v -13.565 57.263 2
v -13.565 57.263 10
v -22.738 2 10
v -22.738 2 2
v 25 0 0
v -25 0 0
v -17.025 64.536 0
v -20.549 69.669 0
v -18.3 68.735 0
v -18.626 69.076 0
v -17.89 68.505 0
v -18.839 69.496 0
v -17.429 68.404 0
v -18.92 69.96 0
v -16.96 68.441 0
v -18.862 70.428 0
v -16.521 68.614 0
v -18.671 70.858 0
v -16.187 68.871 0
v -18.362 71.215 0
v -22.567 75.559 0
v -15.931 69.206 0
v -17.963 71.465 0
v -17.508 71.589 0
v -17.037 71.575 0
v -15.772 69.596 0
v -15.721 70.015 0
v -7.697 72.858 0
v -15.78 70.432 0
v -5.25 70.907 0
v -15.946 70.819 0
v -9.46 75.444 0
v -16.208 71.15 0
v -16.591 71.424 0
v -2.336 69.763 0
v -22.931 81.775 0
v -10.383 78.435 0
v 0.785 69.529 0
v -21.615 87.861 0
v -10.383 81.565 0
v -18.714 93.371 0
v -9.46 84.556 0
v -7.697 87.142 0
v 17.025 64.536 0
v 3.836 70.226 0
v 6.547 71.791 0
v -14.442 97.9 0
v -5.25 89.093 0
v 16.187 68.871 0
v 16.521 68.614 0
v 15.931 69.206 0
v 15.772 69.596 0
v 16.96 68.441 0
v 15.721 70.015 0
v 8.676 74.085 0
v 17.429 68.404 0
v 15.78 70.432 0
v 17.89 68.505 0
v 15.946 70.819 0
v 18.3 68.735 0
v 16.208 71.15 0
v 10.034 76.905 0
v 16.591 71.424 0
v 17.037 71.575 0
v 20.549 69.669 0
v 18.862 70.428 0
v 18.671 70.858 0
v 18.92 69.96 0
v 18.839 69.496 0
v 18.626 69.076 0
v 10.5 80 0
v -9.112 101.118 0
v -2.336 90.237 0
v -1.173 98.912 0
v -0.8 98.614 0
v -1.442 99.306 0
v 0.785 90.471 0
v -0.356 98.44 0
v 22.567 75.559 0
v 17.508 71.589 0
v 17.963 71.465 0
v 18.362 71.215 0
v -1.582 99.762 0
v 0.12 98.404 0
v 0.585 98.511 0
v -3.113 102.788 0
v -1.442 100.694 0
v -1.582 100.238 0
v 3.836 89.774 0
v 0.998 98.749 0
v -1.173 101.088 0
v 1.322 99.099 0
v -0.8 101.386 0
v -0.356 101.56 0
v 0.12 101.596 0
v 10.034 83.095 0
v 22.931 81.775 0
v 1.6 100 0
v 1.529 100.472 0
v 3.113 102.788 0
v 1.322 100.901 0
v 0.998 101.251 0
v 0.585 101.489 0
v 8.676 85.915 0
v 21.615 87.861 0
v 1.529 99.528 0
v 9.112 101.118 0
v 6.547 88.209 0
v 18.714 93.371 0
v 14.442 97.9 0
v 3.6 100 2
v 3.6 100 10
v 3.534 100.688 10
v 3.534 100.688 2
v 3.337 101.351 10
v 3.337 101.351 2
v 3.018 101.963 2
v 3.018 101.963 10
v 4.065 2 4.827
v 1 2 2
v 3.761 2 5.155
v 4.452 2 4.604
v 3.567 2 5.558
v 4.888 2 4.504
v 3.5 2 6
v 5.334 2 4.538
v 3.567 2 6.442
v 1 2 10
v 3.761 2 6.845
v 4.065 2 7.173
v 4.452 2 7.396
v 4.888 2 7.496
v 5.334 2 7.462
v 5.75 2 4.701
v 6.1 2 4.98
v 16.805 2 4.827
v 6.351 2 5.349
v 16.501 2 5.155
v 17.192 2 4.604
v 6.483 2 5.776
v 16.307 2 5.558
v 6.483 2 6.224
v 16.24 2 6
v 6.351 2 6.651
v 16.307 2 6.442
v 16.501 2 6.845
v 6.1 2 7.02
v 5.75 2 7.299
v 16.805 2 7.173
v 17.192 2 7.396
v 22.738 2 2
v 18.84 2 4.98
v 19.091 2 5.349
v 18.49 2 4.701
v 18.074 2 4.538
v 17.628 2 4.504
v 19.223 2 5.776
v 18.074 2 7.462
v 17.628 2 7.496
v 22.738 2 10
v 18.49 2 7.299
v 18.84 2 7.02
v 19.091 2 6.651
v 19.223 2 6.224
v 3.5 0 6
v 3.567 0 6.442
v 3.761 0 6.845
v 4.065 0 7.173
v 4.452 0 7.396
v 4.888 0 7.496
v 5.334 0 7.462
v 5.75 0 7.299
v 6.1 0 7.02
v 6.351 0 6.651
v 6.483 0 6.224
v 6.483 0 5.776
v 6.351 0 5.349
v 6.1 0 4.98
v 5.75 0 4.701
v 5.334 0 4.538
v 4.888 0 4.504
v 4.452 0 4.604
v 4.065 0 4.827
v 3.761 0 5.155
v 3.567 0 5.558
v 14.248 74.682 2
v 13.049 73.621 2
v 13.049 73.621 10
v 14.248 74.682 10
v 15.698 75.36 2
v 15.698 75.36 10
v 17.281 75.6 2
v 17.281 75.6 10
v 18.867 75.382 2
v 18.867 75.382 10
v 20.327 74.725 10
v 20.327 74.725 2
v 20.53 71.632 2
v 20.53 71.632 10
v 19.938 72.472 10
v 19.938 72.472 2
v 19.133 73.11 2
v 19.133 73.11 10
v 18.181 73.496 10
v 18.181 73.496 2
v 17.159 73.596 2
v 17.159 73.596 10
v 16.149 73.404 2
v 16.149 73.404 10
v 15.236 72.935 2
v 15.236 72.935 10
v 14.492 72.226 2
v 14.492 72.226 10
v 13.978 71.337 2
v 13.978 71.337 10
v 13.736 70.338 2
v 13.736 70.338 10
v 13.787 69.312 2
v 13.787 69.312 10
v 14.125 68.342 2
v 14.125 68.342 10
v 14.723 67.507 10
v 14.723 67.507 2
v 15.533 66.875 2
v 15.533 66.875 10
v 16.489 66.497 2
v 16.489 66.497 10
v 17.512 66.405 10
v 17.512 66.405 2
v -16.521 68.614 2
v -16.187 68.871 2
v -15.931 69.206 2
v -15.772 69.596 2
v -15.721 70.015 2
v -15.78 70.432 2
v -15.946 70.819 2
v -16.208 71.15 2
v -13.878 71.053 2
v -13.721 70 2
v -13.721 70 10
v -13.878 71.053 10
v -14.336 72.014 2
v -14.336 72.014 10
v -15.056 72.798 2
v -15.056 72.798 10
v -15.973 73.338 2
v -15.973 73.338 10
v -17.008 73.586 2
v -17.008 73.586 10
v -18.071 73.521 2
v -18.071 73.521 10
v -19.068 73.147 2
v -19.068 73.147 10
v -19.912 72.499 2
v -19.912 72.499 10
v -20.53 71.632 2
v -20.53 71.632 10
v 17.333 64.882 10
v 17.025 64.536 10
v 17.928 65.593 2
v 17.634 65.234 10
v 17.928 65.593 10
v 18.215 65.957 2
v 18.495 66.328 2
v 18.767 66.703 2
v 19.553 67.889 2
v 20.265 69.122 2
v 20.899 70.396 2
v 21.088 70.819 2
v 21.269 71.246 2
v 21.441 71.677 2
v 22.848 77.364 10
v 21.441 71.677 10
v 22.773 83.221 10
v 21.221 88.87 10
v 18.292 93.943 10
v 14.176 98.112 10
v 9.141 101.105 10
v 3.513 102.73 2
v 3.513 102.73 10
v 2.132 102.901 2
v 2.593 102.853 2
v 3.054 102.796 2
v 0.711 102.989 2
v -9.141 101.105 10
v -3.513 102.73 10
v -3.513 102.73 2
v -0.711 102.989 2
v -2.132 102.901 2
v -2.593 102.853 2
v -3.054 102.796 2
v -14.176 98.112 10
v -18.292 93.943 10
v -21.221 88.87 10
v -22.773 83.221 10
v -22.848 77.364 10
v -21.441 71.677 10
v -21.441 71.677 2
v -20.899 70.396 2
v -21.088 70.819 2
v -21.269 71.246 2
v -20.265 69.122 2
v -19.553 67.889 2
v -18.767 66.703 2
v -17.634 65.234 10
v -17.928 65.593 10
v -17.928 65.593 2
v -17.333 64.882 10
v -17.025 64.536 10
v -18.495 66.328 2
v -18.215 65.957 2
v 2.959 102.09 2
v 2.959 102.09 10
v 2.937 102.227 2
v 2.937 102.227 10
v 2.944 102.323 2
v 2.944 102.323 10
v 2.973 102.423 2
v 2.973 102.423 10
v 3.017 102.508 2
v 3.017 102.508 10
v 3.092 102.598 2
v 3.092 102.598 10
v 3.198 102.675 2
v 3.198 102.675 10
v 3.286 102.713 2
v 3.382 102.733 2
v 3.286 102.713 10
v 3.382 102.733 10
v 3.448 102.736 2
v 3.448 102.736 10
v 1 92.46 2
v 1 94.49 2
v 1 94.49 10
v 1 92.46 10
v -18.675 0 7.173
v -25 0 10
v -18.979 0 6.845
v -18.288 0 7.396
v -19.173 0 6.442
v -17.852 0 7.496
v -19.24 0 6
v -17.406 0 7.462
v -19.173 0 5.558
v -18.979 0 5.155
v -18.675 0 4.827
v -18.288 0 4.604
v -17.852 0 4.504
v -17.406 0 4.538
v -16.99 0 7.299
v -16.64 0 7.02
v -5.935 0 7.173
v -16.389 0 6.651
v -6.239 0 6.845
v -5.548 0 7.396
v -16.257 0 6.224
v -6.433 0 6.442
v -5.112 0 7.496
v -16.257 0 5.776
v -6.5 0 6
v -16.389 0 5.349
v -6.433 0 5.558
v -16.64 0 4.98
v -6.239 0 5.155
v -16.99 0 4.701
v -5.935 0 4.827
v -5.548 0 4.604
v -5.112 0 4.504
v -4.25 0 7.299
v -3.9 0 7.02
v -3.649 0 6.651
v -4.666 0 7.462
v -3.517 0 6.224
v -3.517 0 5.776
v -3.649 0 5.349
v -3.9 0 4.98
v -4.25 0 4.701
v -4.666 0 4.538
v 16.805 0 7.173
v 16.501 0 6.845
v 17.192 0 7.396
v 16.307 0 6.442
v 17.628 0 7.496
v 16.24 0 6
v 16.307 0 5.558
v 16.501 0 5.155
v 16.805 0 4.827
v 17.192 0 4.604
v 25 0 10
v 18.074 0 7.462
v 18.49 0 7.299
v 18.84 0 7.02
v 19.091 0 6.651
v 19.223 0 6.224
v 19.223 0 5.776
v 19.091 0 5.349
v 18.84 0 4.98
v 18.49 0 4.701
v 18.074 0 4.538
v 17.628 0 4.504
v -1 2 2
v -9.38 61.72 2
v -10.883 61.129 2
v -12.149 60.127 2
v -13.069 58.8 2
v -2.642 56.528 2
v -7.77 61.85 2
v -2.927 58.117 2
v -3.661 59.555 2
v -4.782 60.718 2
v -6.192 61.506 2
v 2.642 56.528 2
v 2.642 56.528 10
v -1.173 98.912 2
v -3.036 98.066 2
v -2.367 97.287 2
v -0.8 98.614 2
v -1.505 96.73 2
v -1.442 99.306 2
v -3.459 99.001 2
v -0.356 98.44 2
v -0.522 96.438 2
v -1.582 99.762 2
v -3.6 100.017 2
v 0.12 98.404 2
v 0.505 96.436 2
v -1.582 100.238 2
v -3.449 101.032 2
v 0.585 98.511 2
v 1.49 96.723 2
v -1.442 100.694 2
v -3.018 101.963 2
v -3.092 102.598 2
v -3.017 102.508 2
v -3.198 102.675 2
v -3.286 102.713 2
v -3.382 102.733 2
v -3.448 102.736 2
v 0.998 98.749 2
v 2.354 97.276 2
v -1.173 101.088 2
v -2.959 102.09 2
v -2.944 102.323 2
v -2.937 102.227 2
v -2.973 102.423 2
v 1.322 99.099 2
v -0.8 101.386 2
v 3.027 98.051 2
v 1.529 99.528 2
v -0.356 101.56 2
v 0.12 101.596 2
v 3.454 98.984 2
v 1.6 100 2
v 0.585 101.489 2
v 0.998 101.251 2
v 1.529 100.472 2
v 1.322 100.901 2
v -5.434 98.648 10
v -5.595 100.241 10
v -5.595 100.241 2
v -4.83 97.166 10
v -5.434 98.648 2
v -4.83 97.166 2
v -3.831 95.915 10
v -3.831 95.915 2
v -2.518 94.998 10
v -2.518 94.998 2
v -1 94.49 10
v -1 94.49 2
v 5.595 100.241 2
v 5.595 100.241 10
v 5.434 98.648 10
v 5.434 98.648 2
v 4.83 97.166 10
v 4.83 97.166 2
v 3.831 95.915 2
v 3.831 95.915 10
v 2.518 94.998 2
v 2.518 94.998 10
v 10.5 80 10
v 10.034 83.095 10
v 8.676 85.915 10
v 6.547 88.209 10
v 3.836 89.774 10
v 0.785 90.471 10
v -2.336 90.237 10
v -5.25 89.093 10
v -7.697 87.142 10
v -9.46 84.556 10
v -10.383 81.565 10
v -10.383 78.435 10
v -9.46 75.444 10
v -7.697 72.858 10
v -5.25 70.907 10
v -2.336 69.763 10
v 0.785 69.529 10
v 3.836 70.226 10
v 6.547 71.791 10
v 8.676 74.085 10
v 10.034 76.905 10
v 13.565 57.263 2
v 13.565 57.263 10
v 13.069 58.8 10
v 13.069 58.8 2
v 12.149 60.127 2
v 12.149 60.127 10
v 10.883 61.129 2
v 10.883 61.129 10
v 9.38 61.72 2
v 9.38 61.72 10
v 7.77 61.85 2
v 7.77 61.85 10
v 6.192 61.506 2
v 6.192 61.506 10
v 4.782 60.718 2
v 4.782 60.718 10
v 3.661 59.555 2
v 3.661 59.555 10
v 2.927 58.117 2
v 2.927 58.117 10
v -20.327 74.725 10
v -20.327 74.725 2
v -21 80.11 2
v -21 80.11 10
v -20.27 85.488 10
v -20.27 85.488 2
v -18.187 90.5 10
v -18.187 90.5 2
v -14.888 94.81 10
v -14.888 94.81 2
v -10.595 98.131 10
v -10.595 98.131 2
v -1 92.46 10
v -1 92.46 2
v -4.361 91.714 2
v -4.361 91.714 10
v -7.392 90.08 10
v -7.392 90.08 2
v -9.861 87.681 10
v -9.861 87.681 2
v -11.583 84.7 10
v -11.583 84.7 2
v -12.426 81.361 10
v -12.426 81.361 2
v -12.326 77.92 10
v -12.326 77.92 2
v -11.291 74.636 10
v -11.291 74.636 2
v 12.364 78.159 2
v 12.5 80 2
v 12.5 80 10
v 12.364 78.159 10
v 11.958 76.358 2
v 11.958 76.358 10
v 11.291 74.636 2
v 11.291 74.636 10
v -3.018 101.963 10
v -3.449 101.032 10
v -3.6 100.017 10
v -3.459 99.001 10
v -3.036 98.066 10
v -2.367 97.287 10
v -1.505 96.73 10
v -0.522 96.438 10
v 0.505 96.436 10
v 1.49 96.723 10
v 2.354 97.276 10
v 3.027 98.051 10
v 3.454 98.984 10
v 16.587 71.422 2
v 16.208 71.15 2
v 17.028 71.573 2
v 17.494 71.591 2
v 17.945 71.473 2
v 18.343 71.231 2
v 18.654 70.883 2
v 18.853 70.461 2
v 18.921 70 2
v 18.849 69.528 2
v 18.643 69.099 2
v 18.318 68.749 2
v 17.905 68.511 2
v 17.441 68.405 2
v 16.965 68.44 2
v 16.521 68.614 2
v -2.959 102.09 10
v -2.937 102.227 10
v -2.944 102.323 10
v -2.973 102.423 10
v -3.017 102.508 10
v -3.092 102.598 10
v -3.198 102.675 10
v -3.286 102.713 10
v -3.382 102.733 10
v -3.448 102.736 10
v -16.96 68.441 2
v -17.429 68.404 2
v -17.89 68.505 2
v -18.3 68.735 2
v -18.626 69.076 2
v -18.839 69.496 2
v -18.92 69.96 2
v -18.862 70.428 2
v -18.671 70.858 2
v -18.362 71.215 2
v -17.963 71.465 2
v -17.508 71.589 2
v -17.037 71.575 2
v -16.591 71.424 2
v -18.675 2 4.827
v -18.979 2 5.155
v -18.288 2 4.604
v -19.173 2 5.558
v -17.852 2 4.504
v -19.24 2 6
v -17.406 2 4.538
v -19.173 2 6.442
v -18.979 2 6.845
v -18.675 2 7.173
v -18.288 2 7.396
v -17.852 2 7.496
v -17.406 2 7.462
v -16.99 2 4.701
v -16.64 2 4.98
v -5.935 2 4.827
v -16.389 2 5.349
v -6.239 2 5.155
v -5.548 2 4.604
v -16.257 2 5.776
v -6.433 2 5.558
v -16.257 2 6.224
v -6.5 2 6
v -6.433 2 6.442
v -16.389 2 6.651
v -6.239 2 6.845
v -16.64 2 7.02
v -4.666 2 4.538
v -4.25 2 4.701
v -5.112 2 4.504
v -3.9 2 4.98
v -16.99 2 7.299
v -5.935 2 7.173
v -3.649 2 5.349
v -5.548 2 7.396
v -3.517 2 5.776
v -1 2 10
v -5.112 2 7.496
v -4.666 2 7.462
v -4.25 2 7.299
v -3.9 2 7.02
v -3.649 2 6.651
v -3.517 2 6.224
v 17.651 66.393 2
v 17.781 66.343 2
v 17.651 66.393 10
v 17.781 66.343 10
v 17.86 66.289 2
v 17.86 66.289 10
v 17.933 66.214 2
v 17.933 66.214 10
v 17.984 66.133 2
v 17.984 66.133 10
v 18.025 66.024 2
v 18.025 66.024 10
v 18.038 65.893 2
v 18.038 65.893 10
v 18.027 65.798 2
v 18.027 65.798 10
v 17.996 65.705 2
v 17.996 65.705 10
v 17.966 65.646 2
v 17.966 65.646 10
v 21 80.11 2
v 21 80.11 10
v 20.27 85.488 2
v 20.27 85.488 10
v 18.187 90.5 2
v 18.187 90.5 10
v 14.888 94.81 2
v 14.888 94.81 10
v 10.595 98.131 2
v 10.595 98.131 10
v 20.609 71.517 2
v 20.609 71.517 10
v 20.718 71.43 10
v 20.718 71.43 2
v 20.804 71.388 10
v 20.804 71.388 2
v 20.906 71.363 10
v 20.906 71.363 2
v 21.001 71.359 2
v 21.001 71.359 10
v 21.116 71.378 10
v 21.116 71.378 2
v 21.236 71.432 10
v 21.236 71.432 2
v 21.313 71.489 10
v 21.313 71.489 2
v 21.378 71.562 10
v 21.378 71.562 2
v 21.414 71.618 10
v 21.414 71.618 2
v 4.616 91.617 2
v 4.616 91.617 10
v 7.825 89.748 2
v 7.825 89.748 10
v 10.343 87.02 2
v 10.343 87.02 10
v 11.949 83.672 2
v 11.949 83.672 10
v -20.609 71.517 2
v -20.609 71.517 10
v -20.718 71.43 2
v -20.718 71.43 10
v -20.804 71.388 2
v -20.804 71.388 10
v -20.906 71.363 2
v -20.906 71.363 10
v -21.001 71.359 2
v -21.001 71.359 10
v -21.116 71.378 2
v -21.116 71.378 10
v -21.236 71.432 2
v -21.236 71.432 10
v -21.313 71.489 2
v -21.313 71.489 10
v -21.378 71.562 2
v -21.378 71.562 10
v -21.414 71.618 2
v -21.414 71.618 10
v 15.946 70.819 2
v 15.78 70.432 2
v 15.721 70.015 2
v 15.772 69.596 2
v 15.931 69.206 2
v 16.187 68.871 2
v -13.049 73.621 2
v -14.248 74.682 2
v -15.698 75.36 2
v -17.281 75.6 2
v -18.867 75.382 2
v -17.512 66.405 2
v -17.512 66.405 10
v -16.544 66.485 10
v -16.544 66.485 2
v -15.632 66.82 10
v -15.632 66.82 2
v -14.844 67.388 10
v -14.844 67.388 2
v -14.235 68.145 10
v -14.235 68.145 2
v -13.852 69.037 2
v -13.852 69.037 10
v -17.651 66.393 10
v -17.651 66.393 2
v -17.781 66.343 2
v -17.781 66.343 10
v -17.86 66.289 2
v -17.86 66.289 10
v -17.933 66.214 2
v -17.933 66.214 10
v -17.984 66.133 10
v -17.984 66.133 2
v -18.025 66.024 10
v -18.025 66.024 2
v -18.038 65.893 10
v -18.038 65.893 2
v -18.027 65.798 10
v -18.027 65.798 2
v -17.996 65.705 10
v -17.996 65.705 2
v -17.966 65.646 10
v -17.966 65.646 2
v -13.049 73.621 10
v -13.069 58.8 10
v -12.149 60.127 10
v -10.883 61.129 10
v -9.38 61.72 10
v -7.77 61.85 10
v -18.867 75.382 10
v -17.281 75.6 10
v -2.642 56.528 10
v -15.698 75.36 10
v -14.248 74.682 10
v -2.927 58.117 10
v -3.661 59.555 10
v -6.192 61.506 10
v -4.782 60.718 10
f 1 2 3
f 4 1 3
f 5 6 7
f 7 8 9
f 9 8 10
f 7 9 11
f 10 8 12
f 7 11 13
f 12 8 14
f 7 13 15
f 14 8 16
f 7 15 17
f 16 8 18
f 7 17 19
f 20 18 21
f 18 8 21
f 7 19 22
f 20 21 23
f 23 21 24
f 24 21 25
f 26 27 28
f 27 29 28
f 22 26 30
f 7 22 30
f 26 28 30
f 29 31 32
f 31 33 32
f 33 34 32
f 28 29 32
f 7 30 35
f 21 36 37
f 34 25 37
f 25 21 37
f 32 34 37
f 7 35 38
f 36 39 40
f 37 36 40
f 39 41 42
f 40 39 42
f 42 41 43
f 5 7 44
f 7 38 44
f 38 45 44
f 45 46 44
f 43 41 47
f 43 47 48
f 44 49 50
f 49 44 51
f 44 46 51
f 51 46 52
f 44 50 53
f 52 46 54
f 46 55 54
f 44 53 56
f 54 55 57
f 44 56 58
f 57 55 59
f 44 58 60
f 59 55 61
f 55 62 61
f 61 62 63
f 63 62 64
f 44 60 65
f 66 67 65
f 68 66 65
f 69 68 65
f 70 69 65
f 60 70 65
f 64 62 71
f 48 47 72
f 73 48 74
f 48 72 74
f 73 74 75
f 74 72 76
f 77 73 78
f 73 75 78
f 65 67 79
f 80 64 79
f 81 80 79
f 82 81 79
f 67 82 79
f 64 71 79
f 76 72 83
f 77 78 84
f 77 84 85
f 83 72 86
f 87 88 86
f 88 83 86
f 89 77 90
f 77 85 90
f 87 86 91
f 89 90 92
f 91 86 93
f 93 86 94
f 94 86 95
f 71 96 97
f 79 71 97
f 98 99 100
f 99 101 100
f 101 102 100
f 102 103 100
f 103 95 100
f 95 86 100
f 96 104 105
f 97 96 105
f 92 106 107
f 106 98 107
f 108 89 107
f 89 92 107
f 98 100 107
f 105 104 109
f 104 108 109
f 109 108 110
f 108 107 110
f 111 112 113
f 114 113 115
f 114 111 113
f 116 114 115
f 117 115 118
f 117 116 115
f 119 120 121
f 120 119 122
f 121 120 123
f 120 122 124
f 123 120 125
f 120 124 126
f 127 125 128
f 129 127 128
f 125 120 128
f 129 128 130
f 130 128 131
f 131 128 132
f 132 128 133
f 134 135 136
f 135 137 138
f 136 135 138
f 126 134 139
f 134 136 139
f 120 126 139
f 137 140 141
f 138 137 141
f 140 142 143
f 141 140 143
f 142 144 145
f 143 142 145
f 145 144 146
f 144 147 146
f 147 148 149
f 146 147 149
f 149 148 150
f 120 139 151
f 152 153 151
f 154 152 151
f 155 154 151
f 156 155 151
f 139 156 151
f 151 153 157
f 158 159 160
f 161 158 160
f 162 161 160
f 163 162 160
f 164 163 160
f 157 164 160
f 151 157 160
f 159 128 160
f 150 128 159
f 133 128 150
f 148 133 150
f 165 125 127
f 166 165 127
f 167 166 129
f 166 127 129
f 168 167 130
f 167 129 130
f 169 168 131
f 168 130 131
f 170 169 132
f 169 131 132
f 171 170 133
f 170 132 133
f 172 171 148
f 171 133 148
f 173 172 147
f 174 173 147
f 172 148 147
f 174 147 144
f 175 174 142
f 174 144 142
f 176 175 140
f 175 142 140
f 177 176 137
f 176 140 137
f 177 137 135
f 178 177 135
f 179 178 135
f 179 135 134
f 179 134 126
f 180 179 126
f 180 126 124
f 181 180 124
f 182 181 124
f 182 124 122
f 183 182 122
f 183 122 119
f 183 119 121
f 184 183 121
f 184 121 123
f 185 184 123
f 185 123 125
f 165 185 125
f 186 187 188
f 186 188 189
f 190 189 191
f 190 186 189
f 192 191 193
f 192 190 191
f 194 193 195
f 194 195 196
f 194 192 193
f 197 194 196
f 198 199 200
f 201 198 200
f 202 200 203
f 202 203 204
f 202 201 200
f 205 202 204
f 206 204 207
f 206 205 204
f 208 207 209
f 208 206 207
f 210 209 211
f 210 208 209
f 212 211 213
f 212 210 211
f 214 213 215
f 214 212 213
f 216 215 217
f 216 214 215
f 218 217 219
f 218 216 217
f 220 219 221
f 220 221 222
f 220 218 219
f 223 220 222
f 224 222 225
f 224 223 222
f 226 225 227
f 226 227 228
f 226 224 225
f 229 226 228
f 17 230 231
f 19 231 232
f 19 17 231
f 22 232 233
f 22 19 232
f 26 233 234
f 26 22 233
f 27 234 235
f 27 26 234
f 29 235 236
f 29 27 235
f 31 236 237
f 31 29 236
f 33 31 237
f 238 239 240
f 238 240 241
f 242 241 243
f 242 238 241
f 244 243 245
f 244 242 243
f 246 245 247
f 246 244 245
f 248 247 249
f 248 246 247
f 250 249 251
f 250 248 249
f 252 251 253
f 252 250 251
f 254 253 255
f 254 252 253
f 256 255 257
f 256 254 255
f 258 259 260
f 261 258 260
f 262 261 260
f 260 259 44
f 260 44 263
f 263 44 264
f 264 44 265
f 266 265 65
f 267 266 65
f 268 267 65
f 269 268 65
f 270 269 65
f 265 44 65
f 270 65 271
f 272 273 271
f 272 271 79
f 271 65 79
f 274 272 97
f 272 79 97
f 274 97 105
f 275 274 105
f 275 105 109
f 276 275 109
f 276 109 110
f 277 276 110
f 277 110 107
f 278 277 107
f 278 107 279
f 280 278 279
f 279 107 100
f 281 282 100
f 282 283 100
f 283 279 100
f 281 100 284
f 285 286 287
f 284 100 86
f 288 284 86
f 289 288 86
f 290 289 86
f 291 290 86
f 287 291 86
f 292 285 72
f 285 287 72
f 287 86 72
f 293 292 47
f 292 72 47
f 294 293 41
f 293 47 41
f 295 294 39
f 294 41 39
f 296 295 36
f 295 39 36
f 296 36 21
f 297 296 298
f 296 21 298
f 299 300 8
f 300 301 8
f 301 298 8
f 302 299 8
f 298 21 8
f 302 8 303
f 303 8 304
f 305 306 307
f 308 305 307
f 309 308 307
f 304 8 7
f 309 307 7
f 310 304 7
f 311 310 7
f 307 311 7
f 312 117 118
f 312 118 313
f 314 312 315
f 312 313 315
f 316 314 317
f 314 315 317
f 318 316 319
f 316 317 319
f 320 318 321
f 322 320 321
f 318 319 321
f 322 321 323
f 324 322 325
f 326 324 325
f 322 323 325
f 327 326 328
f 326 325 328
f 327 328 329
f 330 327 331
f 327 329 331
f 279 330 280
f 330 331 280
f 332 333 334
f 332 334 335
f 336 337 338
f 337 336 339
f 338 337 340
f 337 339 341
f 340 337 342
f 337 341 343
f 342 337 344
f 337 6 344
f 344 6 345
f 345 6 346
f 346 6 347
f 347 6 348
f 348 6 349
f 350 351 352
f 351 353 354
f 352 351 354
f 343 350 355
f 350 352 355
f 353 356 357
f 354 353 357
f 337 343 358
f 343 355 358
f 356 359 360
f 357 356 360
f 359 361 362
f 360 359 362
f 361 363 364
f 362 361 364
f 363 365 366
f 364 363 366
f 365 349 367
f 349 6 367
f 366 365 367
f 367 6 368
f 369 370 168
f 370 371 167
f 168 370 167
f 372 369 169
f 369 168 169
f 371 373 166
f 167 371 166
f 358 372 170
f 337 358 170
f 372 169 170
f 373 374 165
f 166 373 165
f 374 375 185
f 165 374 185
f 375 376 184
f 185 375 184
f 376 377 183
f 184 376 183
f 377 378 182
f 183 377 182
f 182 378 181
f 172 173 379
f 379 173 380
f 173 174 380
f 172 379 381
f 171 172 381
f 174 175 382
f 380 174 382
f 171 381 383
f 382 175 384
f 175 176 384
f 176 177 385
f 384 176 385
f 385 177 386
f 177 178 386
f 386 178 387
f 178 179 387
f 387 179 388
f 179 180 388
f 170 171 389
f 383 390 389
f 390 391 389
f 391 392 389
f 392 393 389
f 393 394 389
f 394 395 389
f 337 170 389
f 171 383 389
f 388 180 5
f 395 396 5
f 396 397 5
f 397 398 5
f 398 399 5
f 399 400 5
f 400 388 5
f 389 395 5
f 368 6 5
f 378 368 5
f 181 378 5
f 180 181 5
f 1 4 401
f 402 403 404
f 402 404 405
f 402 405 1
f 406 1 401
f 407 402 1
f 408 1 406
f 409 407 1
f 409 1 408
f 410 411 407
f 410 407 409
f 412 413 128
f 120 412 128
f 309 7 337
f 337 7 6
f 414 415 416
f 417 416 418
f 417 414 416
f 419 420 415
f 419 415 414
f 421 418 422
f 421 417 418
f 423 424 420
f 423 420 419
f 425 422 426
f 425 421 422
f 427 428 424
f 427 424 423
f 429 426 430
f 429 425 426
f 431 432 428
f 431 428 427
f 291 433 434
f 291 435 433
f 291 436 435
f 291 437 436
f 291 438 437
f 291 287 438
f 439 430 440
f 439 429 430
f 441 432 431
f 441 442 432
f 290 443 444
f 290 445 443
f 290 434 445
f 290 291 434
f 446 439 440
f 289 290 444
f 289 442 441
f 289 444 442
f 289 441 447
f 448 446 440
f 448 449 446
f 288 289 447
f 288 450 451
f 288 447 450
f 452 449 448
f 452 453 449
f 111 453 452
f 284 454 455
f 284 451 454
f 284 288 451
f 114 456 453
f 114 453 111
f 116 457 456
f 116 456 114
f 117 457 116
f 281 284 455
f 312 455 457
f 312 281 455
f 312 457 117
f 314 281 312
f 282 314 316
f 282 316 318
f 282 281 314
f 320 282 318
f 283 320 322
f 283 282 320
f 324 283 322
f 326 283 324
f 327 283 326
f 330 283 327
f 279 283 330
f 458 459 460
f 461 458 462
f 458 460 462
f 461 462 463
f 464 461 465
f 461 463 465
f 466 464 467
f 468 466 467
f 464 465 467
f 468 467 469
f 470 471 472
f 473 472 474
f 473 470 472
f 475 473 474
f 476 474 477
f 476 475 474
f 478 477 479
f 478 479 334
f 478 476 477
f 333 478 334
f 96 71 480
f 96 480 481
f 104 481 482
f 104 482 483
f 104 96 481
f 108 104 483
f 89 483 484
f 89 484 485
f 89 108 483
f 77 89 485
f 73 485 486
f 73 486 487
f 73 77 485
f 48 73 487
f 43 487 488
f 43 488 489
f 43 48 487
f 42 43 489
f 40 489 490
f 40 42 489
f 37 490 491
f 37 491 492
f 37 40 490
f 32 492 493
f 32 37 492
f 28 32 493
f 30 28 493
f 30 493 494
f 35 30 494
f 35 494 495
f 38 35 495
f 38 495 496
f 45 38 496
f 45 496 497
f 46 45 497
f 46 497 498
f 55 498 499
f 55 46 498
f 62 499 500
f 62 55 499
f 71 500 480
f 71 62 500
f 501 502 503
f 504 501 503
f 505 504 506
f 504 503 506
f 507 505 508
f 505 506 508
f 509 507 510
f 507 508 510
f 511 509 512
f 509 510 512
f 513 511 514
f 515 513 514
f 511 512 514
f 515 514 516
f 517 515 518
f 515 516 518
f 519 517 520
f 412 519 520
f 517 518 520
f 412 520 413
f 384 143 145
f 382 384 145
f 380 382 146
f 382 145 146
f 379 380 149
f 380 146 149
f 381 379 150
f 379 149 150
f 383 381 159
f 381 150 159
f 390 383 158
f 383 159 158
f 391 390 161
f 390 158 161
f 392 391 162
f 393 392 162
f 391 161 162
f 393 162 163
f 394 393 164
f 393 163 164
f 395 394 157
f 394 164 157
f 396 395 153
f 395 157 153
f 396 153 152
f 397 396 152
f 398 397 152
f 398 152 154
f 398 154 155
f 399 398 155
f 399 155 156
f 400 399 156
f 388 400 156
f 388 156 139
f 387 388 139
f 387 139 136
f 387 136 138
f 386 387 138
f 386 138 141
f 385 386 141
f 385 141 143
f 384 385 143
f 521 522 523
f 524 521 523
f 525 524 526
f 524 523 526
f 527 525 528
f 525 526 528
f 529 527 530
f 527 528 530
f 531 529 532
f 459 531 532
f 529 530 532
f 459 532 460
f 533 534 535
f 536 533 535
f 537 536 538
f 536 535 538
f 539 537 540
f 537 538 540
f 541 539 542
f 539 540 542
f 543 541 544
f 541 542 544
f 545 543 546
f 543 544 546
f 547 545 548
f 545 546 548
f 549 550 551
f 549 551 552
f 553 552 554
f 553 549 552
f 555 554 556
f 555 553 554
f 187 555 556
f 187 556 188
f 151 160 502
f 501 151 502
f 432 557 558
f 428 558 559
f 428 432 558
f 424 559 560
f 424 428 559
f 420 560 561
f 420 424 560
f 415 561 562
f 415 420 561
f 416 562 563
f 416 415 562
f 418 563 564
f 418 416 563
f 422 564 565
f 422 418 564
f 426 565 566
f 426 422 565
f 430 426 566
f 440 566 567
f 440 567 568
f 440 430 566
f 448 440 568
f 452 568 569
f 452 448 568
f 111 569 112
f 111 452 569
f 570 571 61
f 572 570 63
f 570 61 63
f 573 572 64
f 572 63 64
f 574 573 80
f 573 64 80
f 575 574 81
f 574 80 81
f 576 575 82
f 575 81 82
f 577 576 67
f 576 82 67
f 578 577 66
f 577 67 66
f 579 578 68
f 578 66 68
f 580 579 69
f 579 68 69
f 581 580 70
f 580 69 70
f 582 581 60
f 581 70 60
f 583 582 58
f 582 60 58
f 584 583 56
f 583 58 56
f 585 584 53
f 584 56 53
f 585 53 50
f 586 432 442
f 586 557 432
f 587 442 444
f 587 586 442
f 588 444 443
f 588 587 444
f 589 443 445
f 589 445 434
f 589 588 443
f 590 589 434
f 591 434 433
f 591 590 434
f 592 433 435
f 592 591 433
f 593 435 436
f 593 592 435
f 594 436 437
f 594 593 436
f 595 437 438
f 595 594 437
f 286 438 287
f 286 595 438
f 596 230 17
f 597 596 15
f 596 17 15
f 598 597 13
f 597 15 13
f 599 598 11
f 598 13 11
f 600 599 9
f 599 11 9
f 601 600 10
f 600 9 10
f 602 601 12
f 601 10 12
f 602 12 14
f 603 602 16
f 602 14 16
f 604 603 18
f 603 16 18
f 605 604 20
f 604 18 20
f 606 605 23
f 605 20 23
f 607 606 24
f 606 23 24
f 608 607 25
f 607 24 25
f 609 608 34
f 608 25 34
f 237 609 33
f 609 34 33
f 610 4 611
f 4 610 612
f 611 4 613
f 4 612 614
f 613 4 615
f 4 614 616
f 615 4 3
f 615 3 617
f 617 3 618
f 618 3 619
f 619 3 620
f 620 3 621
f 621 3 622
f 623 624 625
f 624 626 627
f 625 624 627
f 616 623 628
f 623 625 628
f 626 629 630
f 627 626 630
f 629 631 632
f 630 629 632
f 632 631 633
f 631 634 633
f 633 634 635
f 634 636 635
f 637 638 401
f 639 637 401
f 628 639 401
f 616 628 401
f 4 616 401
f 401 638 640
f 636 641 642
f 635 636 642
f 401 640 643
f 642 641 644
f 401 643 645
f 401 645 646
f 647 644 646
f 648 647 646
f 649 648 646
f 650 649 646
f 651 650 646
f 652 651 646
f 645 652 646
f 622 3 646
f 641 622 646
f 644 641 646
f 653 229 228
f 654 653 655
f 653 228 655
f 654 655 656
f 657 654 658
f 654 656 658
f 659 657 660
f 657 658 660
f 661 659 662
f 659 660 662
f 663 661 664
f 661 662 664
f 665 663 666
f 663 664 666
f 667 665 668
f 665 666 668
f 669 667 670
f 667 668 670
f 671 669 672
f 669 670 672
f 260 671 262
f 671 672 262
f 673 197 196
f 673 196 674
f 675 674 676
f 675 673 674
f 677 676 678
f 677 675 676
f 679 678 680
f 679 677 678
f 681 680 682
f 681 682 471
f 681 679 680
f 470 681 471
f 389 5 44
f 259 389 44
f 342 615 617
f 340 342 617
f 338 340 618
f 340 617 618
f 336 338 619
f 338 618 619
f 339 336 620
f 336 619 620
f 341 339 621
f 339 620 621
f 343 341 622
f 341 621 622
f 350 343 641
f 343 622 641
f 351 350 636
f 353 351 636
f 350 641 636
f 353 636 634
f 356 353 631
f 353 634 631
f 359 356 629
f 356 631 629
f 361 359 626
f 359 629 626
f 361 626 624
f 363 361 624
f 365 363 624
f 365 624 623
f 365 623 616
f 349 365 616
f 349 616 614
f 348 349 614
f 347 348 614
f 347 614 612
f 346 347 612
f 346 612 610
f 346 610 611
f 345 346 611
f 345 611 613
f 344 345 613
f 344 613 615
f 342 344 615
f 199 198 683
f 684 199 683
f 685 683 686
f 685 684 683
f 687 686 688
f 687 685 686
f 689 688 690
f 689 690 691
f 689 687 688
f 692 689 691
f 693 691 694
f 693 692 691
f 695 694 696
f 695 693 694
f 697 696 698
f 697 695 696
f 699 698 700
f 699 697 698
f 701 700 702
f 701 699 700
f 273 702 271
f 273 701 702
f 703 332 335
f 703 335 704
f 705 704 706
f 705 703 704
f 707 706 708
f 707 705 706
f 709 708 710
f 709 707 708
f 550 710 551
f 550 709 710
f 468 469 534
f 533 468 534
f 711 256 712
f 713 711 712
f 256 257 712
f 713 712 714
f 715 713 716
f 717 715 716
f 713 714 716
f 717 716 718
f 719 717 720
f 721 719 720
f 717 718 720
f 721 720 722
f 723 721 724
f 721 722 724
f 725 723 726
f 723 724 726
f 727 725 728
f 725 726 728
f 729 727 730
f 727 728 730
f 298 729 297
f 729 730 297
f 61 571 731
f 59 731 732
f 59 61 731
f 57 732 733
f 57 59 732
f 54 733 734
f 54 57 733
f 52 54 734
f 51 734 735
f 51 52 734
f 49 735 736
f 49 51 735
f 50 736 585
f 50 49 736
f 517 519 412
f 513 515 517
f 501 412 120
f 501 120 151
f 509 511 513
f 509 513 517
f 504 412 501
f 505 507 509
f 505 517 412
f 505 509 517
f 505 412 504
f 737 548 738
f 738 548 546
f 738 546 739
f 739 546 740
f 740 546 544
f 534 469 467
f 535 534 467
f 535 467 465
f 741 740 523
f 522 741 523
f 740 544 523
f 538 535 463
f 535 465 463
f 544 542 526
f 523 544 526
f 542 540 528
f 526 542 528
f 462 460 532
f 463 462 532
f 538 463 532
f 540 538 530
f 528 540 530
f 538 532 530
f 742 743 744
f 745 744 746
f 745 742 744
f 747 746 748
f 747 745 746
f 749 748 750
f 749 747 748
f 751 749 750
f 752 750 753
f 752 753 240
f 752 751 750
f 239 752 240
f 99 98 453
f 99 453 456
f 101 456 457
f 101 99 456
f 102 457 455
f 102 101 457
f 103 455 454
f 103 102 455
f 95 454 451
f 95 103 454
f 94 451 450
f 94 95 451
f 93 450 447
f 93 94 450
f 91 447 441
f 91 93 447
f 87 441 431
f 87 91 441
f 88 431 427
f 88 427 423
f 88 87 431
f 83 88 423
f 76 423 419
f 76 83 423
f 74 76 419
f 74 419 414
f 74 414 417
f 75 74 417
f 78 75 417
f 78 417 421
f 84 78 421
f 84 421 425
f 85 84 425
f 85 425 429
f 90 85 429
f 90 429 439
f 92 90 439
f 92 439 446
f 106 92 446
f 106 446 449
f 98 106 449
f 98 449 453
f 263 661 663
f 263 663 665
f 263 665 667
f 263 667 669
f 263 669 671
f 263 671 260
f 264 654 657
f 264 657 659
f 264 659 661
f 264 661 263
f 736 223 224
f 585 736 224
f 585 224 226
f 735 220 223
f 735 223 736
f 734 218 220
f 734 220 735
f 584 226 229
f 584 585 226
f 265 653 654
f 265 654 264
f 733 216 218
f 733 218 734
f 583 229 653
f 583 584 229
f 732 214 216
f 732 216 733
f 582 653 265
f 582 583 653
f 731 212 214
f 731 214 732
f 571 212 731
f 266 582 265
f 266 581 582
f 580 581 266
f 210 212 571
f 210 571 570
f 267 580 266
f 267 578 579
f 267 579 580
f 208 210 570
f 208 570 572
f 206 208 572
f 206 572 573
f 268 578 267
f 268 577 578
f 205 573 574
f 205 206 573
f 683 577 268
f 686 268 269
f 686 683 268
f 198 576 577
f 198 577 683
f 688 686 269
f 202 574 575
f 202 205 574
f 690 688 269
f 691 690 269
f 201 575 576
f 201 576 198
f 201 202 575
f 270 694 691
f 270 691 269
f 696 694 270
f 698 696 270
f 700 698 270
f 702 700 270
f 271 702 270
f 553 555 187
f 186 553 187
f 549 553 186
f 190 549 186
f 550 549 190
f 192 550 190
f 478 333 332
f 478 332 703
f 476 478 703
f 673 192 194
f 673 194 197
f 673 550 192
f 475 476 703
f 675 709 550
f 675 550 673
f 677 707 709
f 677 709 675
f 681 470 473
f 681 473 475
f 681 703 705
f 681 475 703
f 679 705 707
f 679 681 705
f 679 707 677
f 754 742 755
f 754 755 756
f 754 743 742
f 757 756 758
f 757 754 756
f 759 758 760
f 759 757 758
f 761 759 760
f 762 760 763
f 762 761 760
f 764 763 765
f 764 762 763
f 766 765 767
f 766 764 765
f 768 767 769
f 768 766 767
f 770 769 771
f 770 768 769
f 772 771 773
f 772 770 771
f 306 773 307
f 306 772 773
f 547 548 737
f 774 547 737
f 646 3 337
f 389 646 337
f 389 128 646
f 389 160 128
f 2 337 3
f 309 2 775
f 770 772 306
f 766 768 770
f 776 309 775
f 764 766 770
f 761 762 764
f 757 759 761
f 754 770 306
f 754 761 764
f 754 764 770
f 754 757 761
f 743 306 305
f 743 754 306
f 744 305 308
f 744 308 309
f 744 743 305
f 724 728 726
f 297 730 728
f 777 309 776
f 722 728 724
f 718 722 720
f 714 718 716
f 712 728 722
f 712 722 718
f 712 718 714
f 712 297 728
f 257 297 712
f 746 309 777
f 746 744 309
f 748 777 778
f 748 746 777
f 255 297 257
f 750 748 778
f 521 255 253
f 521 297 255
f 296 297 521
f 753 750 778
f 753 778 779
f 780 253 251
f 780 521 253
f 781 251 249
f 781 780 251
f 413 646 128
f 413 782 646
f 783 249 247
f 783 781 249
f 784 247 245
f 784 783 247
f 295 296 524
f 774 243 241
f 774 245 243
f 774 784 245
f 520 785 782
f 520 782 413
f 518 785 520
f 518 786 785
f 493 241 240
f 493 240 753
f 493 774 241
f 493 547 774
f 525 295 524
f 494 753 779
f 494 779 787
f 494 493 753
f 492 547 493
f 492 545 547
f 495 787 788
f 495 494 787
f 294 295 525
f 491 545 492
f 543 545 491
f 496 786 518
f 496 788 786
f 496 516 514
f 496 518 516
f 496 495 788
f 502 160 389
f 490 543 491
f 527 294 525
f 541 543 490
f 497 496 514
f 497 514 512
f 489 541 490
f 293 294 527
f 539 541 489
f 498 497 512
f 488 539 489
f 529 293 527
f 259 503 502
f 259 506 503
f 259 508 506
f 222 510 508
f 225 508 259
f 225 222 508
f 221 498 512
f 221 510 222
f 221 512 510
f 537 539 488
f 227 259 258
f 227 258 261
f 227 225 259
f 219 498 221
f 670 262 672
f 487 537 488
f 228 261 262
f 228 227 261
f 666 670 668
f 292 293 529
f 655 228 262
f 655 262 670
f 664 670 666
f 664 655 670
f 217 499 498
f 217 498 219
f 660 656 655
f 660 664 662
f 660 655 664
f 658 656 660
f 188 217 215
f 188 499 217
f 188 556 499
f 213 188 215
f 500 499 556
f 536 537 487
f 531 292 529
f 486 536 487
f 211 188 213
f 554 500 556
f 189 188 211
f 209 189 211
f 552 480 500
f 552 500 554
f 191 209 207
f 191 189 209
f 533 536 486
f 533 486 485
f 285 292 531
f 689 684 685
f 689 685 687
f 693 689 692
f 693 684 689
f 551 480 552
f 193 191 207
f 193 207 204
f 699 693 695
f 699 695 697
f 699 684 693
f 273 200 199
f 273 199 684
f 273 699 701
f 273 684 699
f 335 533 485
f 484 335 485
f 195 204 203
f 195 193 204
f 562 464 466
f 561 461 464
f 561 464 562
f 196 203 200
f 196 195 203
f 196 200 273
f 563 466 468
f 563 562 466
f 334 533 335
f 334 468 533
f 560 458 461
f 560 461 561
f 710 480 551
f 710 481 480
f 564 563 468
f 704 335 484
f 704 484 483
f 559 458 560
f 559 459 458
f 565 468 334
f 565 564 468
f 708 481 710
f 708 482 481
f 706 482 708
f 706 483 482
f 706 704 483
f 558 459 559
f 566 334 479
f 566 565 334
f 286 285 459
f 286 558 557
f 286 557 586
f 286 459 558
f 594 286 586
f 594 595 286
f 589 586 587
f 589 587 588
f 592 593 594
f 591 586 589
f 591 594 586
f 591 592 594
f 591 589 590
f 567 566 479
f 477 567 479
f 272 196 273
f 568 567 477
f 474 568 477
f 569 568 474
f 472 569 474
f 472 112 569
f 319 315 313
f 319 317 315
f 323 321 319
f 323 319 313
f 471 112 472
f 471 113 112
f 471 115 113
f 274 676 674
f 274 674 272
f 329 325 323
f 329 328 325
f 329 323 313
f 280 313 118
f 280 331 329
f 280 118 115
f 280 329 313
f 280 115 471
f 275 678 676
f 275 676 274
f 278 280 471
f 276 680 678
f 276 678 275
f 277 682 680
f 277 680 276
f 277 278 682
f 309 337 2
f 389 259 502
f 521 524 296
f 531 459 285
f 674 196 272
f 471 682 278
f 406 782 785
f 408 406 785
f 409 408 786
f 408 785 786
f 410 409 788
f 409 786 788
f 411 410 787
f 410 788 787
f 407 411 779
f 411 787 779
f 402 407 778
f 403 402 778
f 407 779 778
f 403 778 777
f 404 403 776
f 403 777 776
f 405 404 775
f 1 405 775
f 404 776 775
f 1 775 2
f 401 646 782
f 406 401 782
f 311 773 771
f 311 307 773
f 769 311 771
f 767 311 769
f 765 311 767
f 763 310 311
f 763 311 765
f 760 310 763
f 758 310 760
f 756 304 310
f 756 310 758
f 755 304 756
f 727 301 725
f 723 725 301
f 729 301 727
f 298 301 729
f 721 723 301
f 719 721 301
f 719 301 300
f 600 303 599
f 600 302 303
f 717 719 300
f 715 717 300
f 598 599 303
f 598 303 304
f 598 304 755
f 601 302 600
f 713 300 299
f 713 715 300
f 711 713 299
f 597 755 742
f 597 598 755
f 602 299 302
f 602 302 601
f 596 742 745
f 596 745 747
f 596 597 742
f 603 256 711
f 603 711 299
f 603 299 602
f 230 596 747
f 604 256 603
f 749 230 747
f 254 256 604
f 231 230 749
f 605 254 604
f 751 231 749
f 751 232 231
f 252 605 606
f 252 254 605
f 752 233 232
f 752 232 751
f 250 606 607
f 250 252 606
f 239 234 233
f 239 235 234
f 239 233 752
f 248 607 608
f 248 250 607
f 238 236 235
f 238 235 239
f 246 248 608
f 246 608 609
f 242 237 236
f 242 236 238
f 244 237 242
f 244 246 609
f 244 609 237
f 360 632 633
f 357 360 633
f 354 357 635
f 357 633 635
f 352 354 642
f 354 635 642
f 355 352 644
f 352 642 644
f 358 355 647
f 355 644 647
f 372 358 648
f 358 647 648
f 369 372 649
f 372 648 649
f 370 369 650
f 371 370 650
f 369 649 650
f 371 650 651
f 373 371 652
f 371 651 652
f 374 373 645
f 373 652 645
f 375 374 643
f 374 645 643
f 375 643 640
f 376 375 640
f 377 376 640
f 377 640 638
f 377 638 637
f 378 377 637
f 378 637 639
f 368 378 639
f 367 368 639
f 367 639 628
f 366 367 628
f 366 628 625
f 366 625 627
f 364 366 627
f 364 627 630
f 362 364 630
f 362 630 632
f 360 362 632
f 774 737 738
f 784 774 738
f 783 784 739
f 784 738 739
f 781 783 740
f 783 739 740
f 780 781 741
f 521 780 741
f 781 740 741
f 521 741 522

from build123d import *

# Parameters (mm, degrees)
SKETCH_1_R          = 10.5
EXTRUDE_1_DEPTH     = 10
CUT_EXTRUDE_2_DEPTH = 8
SKETCH_3_R          = 1.5
CUT_EXTRUDE_3_DEPTH = 97.81941954
EXTRUDE_START       = -10
SKETCH_4_R          = 1.6
EXTRUDE_3_DEPTH     = 10
CUT_EXTRUDE_START   = -10
SKETCH_5_R          = 1.6
CUT_EXTRUDE_4_DEPTH = 10
CUT_EXTRUDE_START_2 = -8
SKETCH_6_R          = 1.6
CUT_EXTRUDE_5_DEPTH = 8
FILLET_1_R          = 0.5


with BuildPart() as part:
    # 草图1 → 凸台-拉伸1 (new body)
    with BuildSketch(Plane.XY):
        with BuildLine():
            Line((-25, 0), (25, 0))
            Line((25, 0), (14.88676655, 81.839614547))
            ThreePointArc((14.88676655, 81.839614547), (0, 95), (-14.88676655, 81.839614547))
            Line((-14.88676655, 81.839614547), (-25, 0))
        make_face()
        with Locations((0, 80)):
            Circle(SKETCH_1_R, mode=Mode.SUBTRACT)
    extrude(amount=EXTRUDE_1_DEPTH)

    # 草图2 → 切除-拉伸2 (cut)
    with BuildSketch(Plane.XY.offset(10)):
        with BuildLine():
            Line((-13.564970556, 57.262621959), (-22.737639737, 2))
            Line((-22.737639737, 2), (-1, 2))
            Line((-1, 2), (-2.641694958, 56.527552532))
            ThreePointArc((-2.641694958, 56.527552532), (-7.769922801, 61.84962447), (-13.564970556, 57.262621959))
        make_face()
        with BuildLine():
            Line((2.641694958, 56.527552532), (1, 2))
            Line((1, 2), (22.737639737, 2))
            Line((22.737639737, 2), (13.564970556, 57.262621959))
            ThreePointArc((13.564970556, 57.262621959), (7.769922801, 61.84962447), (2.641694958, 56.527552532))
        make_face()
    extrude(amount=-CUT_EXTRUDE_2_DEPTH, mode=Mode.SUBTRACT)

    # 草图3 → 切除-拉伸3 (cut, through all)
    with BuildSketch(Plane(origin=(0, 2, 0), x_dir=(1, 0, 0), z_dir=(0, 1, 0))):
        with Locations(Location((-17.74, -6, 0), (0, 0, 180))):
            Circle(SKETCH_3_R)
        with Locations(Location((-5, -6, 0), (0, 0, 180))):
            Circle(SKETCH_3_R)
        with Locations(Location((5, -6, 0), (0, 0, 180))):
            Circle(SKETCH_3_R)
        with Locations(Location((17.74, -6, 0), (0, 0, 180))):
            Circle(SKETCH_3_R)
    extrude(amount=-CUT_EXTRUDE_3_DEPTH, mode=Mode.SUBTRACT)

    # 草图4 → 凸台-拉伸3 (add)
    with BuildSketch(Plane.XY.offset(10).offset(EXTRUDE_START)):
        with BuildLine():
            Line((16.521104317, 68.614015285), (17.025084925, 64.535638283))
            ThreePointArc((17.025084925, 64.535638283), (0, 103), (-17.025084925, 64.535638283))
            Line((-17.025084925, 64.535638283), (-16.521104317, 68.614015285))
            ThreePointArc((-16.521104317, 68.614015285), (-18.908429841, 70.196225552), (-16.207760954, 71.149692934))
            Line((-16.207760954, 71.149692934), (-14.88676655, 81.839614547))
            ThreePointArc((-14.88676655, 81.839614547), (0, 95), (14.88676655, 81.839614547))
            Line((14.88676655, 81.839614547), (16.207760954, 71.149692934))
            ThreePointArc((16.207760954, 71.149692934), (18.908429841, 70.196225552), (16.521104317, 68.614015285))
        make_face()
        with Locations((0, 100)):
            Circle(SKETCH_4_R, mode=Mode.SUBTRACT)
    extrude(amount=EXTRUDE_3_DEPTH)

    # 草图5 → 切除-拉伸4 (cut)
    with BuildSketch(Plane.XY.offset(10).offset(CUT_EXTRUDE_START)):
        with Locations((-17.320508076, 70)):
            Circle(SKETCH_5_R)
        with Locations((17.320508076, 70)):
            Circle(SKETCH_5_R)
    extrude(amount=CUT_EXTRUDE_4_DEPTH, mode=Mode.SUBTRACT)

    # 草图6 → 切除-拉伸5 (cut)
    # profile 1 of 5: a face of its own
    with BuildSketch(Plane.XY.offset(10).offset(CUT_EXTRUDE_START_2)):
        with BuildLine():
            ThreePointArc((-13.04871596, 73.621020867), (-16.480843406, 75.536692446), (-20.326626095, 74.724749142))
            ThreePointArc((-20.326626095, 74.724749142), (-18.186533479, 90.5), (-5.594811793, 100.241))
            ThreePointArc((-5.594811793, 100.241), (-4.375083977, 96.504482843), (-1, 94.490009074))
            Line((-1, 94.490009074), (-1, 92.459935794))
            ThreePointArc((-1, 92.459935794), (-10.825317547, 86.25), (-11.290620927, 74.636057507))
            Line((-11.290620927, 74.636057507), (-13.04871596, 73.621020867))
        make_face()
    # profile 2 of 5: a face of its own
    with BuildSketch(Plane.XY.offset(10).offset(CUT_EXTRUDE_START_2)):
        with BuildLine():
            ThreePointArc((2.131712692, 102.901), (0, 103), (-2.131712692, 102.901))
            ThreePointArc((-2.131712692, 102.901), (-1.625705125, 96.787978387), (3.6, 100))
            ThreePointArc((3.6, 100), (3.212021613, 101.625705125), (2.131712692, 102.901))
        make_face()
        with Locations((0, 100)):
            Circle(SKETCH_6_R, mode=Mode.SUBTRACT)
    # profile 3 of 5: a face of its own
    with BuildSketch(Plane.XY.offset(10).offset(CUT_EXTRUDE_START_2)):
        with BuildLine():
            ThreePointArc((12.5, 80), (12.193907528, 77.25070569), (11.290620927, 74.636057507))
            Line((11.290620927, 74.636057507), (13.04871596, 73.621020867))
            ThreePointArc((13.04871596, 73.621020867), (16.480843406, 75.536692446), (20.326626095, 74.724749142))
            ThreePointArc((20.326626095, 74.724749142), (18.186533479, 90.5), (5.594811793, 100.241))
            ThreePointArc((5.594811793, 100.241), (4.375083977, 96.504482843), (1, 94.490009074))
            Line((1, 94.490009074), (1, 92.459935794))
            ThreePointArc((1, 92.459935794), (9.185586535, 88.477912479), (12.5, 80))
        make_face()
    # profile 4 of 5: a face of its own
    with BuildSketch(Plane.XY.offset(10).offset(CUT_EXTRUDE_START_2)):
        with BuildLine():
            ThreePointArc((18.766991426, 66.703382655), (19.918584287, 68.5), (20.898704118, 70.395617345))
            ThreePointArc((20.898704118, 70.395617345), (14.202816622, 71.8), (18.766991426, 66.703382655))
        make_face()
        with BuildLine():
            ThreePointArc((16.207760954, 71.149692934), (17.944849571, 71.473159088), (18.920508076, 70))
            ThreePointArc((18.920508076, 70), (18.120806141, 68.614531485), (16.521104317, 68.614015285))
            ThreePointArc((16.521104317, 68.614015285), (15.73258631, 69.803774448), (16.207760954, 71.149692934))
        make_face(mode=Mode.SUBTRACT)
    # profile 5 of 5: a face of its own
    with BuildSketch(Plane.XY.offset(10).offset(CUT_EXTRUDE_START_2)):
        with BuildLine():
            ThreePointArc((-18.766991426, 66.703382655), (-15.351668324, 66.986087256), (-13.720508076, 70))
            ThreePointArc((-13.720508076, 70), (-17.122399207, 73.594544877), (-20.898704118, 70.395617345))
            ThreePointArc((-20.898704118, 70.395617345), (-19.918584287, 68.5), (-18.766991426, 66.703382655))
        make_face()
        with Locations((-17.320508076, 70)):
            Circle(SKETCH_6_R, mode=Mode.SUBTRACT)
    extrude(amount=CUT_EXTRUDE_5_DEPTH, mode=Mode.SUBTRACT)

    # 圆角1
    fillet_1_edges = [part.edges().sort_by_distance(p)[0] for p in [
        (-2.131712692, 102.901, 6),
        (2.131712692, 102.901, 6),
        (20.898704118, 70.395617345, 6),
        (18.766991426, 66.703382655, 6),
        (-18.766991426, 66.703382655, 6),
        (-20.898704118, 70.395617345, 6),
    ]]
    fillet(fillet_1_edges, radius=FILLET_1_R)


solid = part.part
